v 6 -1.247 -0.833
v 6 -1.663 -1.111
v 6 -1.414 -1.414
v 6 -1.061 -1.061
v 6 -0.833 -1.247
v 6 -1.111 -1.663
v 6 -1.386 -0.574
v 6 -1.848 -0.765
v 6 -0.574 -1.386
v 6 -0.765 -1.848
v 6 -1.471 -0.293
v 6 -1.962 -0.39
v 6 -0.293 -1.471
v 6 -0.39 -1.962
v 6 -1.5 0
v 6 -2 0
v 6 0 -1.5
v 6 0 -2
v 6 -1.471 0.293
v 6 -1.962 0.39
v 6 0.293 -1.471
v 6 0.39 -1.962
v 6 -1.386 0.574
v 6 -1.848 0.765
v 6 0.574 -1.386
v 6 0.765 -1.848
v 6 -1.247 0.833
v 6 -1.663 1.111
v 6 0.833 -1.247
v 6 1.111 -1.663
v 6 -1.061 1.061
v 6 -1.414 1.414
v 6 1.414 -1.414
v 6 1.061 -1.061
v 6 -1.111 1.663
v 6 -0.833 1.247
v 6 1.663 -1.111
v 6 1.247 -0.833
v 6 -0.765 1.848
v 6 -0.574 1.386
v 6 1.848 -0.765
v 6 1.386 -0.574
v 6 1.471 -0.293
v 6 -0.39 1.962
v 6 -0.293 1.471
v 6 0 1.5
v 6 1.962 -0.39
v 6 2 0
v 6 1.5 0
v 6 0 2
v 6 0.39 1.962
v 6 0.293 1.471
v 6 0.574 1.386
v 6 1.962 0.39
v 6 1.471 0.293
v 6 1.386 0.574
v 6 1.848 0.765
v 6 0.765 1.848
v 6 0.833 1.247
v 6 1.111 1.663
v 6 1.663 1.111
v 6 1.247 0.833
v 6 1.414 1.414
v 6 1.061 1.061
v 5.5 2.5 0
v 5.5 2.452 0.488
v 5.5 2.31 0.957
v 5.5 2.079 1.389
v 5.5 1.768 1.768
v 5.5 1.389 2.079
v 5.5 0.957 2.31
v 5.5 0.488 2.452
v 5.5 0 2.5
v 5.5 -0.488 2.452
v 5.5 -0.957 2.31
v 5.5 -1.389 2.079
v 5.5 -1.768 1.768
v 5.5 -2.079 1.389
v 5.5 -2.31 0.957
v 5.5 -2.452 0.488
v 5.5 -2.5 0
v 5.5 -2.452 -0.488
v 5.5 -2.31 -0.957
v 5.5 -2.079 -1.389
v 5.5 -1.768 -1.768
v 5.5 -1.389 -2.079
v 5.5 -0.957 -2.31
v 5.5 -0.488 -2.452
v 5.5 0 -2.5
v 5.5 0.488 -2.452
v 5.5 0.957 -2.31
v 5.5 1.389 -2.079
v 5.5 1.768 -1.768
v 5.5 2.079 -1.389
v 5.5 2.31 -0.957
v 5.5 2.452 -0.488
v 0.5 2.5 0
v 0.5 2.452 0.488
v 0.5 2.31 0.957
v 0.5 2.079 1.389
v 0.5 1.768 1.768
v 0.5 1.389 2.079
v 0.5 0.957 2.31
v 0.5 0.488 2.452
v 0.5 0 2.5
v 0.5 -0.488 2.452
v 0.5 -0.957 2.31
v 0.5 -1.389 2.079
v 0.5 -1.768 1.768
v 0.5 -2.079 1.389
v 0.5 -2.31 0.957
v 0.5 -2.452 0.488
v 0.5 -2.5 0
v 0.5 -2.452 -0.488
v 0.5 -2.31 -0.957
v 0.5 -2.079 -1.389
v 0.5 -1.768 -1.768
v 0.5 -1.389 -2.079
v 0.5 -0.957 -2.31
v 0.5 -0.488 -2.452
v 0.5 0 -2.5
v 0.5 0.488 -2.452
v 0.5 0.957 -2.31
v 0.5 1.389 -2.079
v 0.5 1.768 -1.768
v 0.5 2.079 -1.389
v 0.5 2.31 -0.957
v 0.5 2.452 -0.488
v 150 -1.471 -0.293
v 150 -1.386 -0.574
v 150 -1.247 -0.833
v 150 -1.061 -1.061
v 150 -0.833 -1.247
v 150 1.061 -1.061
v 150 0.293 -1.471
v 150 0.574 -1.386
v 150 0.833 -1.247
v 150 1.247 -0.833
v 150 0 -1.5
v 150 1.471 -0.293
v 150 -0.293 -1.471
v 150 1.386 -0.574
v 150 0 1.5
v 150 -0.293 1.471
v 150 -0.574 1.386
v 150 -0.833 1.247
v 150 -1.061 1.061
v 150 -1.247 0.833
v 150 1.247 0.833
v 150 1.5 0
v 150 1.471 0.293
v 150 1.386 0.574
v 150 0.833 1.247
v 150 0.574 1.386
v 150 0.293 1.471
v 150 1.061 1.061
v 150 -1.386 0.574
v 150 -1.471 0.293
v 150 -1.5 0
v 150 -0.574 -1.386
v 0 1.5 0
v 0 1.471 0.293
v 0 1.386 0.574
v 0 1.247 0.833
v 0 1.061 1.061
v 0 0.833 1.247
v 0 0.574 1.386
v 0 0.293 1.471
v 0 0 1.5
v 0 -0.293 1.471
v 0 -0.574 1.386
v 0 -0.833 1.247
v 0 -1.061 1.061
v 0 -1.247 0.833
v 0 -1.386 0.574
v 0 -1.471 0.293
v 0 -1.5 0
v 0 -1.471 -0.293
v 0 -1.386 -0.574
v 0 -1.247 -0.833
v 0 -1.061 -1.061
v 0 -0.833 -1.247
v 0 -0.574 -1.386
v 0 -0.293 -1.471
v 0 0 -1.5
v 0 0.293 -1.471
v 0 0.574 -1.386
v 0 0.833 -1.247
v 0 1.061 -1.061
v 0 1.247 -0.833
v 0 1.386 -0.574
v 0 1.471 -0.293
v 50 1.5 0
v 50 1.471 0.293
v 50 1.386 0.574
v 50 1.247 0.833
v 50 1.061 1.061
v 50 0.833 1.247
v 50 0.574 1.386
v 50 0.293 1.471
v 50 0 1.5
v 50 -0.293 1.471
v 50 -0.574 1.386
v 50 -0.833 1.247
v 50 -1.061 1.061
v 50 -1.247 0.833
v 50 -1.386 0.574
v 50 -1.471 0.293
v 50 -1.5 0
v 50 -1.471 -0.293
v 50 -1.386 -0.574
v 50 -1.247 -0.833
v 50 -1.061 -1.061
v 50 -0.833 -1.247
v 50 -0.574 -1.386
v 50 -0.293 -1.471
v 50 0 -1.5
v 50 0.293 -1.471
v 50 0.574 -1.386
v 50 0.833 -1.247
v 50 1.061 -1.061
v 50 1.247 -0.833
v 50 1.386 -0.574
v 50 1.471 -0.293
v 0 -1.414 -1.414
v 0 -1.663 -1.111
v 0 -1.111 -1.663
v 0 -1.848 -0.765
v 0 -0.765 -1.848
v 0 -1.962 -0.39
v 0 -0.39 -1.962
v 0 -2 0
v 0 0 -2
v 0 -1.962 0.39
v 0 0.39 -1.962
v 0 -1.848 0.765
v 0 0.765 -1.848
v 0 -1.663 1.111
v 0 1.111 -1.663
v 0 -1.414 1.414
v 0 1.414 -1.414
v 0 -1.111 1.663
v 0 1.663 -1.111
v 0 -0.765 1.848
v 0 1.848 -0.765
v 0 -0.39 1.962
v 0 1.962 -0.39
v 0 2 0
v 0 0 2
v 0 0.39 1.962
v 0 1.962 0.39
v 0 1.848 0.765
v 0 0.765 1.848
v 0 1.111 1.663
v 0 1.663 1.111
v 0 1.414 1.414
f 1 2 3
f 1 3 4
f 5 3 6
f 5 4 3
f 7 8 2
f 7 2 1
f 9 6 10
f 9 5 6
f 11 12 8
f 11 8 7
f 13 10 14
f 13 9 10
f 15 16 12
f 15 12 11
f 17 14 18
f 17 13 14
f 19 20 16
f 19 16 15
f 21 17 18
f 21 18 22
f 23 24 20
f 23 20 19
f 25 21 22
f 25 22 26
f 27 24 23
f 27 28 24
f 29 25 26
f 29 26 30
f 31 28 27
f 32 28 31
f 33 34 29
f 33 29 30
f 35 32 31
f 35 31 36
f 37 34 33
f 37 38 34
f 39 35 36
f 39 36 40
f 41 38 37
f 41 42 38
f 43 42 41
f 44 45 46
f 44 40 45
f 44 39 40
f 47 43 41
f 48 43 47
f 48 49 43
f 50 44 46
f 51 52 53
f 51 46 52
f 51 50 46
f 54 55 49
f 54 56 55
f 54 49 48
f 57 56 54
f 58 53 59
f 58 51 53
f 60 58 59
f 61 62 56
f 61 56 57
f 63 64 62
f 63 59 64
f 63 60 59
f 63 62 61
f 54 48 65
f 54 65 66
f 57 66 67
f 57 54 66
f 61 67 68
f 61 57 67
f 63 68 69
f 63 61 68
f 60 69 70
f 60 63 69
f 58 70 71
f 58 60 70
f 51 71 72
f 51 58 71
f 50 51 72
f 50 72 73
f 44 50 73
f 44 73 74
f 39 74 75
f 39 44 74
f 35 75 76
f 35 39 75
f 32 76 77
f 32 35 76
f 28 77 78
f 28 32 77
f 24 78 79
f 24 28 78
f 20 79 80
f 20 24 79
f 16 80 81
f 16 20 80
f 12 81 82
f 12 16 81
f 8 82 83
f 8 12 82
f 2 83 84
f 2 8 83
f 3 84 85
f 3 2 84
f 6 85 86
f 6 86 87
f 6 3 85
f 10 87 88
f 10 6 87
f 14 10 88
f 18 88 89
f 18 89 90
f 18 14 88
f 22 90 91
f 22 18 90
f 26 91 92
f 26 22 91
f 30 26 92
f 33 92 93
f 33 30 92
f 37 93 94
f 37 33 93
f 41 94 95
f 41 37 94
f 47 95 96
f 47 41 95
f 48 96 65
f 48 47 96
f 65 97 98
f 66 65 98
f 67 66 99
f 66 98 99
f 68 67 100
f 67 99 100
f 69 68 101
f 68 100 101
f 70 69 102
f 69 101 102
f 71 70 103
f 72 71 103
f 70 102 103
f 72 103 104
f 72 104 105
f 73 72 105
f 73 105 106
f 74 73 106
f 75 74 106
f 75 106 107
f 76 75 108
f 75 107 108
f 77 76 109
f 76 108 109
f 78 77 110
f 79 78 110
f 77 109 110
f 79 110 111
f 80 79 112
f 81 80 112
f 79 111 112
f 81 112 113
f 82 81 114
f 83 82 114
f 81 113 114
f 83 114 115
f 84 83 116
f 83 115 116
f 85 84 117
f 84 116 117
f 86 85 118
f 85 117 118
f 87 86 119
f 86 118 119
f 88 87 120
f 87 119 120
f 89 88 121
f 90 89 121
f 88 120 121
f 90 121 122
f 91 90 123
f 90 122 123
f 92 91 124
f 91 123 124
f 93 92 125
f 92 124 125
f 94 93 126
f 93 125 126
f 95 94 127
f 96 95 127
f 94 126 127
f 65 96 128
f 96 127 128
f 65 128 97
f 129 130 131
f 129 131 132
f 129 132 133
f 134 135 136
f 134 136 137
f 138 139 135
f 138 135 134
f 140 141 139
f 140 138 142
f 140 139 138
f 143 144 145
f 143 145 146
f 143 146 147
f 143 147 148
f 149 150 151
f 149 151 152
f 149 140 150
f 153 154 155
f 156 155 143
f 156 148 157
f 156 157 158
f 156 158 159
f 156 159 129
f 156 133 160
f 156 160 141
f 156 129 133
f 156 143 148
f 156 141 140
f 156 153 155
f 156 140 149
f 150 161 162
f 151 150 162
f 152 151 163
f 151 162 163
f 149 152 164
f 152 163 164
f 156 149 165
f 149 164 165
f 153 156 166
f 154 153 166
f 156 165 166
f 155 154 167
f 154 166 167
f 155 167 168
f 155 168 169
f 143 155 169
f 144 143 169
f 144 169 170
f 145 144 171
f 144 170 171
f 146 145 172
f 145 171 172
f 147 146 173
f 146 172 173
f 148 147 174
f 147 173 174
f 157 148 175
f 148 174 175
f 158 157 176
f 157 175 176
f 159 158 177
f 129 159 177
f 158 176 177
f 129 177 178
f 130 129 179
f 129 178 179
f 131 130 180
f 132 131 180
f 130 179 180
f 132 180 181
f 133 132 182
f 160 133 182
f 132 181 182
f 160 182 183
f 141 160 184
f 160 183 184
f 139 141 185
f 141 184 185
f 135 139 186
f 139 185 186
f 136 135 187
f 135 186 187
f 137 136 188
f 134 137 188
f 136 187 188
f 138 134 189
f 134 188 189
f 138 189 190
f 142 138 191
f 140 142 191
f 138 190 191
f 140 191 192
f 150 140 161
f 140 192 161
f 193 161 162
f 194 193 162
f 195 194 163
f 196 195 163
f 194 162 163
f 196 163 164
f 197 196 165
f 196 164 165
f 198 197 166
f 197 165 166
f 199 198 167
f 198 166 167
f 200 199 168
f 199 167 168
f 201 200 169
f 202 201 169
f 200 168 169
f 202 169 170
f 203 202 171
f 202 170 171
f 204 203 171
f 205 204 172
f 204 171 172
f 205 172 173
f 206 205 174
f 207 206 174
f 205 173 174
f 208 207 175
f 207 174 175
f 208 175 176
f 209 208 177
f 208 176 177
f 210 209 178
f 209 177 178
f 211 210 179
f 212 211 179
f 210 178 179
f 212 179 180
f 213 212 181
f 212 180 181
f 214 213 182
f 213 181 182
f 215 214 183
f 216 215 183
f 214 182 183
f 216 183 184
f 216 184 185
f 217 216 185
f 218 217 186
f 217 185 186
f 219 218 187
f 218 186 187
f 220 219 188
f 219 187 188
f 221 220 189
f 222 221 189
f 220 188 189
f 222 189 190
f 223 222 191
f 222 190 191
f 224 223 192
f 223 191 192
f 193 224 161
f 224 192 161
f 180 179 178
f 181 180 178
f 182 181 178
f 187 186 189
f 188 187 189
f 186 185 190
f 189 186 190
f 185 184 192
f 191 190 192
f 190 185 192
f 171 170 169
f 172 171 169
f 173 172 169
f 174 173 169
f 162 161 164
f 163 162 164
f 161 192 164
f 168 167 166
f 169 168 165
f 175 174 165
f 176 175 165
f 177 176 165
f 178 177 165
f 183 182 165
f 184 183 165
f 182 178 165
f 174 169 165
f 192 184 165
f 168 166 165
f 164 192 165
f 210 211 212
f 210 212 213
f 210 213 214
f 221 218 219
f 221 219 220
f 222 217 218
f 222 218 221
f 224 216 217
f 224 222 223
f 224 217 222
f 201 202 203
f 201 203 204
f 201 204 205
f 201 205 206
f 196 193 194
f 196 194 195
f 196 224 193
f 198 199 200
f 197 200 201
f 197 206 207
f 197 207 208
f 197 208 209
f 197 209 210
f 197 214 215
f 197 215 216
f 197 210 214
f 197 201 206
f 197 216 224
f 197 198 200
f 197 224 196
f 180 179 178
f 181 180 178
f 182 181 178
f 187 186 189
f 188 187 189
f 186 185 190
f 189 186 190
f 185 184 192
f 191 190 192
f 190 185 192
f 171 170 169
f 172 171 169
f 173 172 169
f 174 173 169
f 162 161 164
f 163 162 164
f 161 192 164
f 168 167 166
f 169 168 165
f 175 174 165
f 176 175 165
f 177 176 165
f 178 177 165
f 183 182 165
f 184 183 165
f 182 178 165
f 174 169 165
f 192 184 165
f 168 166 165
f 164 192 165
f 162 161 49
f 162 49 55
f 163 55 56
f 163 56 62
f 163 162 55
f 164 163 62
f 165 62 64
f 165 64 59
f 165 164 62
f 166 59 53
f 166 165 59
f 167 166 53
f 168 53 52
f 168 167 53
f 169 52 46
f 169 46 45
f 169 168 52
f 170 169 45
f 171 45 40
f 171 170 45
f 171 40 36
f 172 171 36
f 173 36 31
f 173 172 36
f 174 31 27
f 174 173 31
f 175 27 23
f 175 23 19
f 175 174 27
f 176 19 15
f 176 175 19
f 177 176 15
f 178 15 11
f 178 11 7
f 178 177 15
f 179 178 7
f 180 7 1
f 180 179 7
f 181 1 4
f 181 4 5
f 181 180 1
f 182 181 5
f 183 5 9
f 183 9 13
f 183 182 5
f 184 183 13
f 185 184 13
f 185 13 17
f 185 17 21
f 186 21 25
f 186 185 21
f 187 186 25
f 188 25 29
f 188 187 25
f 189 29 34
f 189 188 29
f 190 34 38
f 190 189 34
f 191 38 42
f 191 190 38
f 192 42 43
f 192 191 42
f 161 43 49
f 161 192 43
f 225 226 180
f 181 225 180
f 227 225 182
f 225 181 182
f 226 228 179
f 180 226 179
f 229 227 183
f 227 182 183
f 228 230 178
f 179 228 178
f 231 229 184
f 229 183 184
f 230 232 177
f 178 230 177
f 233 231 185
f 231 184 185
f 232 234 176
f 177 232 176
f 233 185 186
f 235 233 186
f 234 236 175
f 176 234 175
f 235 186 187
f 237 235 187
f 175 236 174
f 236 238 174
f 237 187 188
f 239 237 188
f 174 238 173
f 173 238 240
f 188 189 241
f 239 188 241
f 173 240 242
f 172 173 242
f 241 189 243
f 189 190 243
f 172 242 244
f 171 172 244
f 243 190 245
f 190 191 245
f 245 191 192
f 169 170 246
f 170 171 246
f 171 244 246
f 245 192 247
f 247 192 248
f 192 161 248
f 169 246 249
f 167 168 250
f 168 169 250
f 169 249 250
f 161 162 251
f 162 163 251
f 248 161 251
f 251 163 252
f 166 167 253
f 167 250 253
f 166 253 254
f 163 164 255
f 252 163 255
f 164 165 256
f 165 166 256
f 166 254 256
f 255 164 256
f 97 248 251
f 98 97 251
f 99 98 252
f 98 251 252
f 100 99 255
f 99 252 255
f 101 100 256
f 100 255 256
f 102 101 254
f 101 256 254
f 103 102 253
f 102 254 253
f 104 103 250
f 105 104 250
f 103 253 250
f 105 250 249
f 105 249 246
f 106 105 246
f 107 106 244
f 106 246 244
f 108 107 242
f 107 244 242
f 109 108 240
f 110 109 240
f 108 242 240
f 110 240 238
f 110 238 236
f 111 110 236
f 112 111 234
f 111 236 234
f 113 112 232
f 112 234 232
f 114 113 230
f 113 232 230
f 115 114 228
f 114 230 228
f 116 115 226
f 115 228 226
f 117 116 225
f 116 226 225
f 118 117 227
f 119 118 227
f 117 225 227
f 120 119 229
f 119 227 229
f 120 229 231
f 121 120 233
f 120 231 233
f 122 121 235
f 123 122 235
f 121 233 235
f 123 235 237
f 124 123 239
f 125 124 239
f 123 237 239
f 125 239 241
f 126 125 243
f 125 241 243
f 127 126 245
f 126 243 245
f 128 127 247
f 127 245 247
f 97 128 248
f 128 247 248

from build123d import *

# Parameters (mm, degrees)
F0_R     = 1.5
F1_DEPTH = 150
F2_DEPTH = 50
F3_R     = 2.5
F3_R_2   = 1.5
F4_DEPTH = 6
F5_SIZE  = 0.5


with BuildPart() as f1:
    # F0 (on Right) → F1 (new body)
    with BuildSketch(Plane.YZ):
        Circle(F0_R)
    extrude(amount=F1_DEPTH)


with BuildPart() as f2:
    # F0 (on Right) → F2 (new body)
    with BuildSketch(Plane.YZ):
        Circle(F0_R)
    extrude(amount=F2_DEPTH)


with BuildPart() as f4:
    # F3 (on Right) → F4 (new body)
    with BuildSketch(Plane.YZ):
        Circle(F3_R)
        Circle(F3_R_2, mode=Mode.SUBTRACT)
    extrude(amount=F4_DEPTH)

    # F5
    f5_edges = [f4.edges().sort_by_distance(p)[0] for p in [
        (6, -2.5, 0),
        (0, -2.5, 0),
    ]]
    chamfer(f5_edges, length=F5_SIZE)


solid = Compound([f1.part, f2.part, f4.part])
